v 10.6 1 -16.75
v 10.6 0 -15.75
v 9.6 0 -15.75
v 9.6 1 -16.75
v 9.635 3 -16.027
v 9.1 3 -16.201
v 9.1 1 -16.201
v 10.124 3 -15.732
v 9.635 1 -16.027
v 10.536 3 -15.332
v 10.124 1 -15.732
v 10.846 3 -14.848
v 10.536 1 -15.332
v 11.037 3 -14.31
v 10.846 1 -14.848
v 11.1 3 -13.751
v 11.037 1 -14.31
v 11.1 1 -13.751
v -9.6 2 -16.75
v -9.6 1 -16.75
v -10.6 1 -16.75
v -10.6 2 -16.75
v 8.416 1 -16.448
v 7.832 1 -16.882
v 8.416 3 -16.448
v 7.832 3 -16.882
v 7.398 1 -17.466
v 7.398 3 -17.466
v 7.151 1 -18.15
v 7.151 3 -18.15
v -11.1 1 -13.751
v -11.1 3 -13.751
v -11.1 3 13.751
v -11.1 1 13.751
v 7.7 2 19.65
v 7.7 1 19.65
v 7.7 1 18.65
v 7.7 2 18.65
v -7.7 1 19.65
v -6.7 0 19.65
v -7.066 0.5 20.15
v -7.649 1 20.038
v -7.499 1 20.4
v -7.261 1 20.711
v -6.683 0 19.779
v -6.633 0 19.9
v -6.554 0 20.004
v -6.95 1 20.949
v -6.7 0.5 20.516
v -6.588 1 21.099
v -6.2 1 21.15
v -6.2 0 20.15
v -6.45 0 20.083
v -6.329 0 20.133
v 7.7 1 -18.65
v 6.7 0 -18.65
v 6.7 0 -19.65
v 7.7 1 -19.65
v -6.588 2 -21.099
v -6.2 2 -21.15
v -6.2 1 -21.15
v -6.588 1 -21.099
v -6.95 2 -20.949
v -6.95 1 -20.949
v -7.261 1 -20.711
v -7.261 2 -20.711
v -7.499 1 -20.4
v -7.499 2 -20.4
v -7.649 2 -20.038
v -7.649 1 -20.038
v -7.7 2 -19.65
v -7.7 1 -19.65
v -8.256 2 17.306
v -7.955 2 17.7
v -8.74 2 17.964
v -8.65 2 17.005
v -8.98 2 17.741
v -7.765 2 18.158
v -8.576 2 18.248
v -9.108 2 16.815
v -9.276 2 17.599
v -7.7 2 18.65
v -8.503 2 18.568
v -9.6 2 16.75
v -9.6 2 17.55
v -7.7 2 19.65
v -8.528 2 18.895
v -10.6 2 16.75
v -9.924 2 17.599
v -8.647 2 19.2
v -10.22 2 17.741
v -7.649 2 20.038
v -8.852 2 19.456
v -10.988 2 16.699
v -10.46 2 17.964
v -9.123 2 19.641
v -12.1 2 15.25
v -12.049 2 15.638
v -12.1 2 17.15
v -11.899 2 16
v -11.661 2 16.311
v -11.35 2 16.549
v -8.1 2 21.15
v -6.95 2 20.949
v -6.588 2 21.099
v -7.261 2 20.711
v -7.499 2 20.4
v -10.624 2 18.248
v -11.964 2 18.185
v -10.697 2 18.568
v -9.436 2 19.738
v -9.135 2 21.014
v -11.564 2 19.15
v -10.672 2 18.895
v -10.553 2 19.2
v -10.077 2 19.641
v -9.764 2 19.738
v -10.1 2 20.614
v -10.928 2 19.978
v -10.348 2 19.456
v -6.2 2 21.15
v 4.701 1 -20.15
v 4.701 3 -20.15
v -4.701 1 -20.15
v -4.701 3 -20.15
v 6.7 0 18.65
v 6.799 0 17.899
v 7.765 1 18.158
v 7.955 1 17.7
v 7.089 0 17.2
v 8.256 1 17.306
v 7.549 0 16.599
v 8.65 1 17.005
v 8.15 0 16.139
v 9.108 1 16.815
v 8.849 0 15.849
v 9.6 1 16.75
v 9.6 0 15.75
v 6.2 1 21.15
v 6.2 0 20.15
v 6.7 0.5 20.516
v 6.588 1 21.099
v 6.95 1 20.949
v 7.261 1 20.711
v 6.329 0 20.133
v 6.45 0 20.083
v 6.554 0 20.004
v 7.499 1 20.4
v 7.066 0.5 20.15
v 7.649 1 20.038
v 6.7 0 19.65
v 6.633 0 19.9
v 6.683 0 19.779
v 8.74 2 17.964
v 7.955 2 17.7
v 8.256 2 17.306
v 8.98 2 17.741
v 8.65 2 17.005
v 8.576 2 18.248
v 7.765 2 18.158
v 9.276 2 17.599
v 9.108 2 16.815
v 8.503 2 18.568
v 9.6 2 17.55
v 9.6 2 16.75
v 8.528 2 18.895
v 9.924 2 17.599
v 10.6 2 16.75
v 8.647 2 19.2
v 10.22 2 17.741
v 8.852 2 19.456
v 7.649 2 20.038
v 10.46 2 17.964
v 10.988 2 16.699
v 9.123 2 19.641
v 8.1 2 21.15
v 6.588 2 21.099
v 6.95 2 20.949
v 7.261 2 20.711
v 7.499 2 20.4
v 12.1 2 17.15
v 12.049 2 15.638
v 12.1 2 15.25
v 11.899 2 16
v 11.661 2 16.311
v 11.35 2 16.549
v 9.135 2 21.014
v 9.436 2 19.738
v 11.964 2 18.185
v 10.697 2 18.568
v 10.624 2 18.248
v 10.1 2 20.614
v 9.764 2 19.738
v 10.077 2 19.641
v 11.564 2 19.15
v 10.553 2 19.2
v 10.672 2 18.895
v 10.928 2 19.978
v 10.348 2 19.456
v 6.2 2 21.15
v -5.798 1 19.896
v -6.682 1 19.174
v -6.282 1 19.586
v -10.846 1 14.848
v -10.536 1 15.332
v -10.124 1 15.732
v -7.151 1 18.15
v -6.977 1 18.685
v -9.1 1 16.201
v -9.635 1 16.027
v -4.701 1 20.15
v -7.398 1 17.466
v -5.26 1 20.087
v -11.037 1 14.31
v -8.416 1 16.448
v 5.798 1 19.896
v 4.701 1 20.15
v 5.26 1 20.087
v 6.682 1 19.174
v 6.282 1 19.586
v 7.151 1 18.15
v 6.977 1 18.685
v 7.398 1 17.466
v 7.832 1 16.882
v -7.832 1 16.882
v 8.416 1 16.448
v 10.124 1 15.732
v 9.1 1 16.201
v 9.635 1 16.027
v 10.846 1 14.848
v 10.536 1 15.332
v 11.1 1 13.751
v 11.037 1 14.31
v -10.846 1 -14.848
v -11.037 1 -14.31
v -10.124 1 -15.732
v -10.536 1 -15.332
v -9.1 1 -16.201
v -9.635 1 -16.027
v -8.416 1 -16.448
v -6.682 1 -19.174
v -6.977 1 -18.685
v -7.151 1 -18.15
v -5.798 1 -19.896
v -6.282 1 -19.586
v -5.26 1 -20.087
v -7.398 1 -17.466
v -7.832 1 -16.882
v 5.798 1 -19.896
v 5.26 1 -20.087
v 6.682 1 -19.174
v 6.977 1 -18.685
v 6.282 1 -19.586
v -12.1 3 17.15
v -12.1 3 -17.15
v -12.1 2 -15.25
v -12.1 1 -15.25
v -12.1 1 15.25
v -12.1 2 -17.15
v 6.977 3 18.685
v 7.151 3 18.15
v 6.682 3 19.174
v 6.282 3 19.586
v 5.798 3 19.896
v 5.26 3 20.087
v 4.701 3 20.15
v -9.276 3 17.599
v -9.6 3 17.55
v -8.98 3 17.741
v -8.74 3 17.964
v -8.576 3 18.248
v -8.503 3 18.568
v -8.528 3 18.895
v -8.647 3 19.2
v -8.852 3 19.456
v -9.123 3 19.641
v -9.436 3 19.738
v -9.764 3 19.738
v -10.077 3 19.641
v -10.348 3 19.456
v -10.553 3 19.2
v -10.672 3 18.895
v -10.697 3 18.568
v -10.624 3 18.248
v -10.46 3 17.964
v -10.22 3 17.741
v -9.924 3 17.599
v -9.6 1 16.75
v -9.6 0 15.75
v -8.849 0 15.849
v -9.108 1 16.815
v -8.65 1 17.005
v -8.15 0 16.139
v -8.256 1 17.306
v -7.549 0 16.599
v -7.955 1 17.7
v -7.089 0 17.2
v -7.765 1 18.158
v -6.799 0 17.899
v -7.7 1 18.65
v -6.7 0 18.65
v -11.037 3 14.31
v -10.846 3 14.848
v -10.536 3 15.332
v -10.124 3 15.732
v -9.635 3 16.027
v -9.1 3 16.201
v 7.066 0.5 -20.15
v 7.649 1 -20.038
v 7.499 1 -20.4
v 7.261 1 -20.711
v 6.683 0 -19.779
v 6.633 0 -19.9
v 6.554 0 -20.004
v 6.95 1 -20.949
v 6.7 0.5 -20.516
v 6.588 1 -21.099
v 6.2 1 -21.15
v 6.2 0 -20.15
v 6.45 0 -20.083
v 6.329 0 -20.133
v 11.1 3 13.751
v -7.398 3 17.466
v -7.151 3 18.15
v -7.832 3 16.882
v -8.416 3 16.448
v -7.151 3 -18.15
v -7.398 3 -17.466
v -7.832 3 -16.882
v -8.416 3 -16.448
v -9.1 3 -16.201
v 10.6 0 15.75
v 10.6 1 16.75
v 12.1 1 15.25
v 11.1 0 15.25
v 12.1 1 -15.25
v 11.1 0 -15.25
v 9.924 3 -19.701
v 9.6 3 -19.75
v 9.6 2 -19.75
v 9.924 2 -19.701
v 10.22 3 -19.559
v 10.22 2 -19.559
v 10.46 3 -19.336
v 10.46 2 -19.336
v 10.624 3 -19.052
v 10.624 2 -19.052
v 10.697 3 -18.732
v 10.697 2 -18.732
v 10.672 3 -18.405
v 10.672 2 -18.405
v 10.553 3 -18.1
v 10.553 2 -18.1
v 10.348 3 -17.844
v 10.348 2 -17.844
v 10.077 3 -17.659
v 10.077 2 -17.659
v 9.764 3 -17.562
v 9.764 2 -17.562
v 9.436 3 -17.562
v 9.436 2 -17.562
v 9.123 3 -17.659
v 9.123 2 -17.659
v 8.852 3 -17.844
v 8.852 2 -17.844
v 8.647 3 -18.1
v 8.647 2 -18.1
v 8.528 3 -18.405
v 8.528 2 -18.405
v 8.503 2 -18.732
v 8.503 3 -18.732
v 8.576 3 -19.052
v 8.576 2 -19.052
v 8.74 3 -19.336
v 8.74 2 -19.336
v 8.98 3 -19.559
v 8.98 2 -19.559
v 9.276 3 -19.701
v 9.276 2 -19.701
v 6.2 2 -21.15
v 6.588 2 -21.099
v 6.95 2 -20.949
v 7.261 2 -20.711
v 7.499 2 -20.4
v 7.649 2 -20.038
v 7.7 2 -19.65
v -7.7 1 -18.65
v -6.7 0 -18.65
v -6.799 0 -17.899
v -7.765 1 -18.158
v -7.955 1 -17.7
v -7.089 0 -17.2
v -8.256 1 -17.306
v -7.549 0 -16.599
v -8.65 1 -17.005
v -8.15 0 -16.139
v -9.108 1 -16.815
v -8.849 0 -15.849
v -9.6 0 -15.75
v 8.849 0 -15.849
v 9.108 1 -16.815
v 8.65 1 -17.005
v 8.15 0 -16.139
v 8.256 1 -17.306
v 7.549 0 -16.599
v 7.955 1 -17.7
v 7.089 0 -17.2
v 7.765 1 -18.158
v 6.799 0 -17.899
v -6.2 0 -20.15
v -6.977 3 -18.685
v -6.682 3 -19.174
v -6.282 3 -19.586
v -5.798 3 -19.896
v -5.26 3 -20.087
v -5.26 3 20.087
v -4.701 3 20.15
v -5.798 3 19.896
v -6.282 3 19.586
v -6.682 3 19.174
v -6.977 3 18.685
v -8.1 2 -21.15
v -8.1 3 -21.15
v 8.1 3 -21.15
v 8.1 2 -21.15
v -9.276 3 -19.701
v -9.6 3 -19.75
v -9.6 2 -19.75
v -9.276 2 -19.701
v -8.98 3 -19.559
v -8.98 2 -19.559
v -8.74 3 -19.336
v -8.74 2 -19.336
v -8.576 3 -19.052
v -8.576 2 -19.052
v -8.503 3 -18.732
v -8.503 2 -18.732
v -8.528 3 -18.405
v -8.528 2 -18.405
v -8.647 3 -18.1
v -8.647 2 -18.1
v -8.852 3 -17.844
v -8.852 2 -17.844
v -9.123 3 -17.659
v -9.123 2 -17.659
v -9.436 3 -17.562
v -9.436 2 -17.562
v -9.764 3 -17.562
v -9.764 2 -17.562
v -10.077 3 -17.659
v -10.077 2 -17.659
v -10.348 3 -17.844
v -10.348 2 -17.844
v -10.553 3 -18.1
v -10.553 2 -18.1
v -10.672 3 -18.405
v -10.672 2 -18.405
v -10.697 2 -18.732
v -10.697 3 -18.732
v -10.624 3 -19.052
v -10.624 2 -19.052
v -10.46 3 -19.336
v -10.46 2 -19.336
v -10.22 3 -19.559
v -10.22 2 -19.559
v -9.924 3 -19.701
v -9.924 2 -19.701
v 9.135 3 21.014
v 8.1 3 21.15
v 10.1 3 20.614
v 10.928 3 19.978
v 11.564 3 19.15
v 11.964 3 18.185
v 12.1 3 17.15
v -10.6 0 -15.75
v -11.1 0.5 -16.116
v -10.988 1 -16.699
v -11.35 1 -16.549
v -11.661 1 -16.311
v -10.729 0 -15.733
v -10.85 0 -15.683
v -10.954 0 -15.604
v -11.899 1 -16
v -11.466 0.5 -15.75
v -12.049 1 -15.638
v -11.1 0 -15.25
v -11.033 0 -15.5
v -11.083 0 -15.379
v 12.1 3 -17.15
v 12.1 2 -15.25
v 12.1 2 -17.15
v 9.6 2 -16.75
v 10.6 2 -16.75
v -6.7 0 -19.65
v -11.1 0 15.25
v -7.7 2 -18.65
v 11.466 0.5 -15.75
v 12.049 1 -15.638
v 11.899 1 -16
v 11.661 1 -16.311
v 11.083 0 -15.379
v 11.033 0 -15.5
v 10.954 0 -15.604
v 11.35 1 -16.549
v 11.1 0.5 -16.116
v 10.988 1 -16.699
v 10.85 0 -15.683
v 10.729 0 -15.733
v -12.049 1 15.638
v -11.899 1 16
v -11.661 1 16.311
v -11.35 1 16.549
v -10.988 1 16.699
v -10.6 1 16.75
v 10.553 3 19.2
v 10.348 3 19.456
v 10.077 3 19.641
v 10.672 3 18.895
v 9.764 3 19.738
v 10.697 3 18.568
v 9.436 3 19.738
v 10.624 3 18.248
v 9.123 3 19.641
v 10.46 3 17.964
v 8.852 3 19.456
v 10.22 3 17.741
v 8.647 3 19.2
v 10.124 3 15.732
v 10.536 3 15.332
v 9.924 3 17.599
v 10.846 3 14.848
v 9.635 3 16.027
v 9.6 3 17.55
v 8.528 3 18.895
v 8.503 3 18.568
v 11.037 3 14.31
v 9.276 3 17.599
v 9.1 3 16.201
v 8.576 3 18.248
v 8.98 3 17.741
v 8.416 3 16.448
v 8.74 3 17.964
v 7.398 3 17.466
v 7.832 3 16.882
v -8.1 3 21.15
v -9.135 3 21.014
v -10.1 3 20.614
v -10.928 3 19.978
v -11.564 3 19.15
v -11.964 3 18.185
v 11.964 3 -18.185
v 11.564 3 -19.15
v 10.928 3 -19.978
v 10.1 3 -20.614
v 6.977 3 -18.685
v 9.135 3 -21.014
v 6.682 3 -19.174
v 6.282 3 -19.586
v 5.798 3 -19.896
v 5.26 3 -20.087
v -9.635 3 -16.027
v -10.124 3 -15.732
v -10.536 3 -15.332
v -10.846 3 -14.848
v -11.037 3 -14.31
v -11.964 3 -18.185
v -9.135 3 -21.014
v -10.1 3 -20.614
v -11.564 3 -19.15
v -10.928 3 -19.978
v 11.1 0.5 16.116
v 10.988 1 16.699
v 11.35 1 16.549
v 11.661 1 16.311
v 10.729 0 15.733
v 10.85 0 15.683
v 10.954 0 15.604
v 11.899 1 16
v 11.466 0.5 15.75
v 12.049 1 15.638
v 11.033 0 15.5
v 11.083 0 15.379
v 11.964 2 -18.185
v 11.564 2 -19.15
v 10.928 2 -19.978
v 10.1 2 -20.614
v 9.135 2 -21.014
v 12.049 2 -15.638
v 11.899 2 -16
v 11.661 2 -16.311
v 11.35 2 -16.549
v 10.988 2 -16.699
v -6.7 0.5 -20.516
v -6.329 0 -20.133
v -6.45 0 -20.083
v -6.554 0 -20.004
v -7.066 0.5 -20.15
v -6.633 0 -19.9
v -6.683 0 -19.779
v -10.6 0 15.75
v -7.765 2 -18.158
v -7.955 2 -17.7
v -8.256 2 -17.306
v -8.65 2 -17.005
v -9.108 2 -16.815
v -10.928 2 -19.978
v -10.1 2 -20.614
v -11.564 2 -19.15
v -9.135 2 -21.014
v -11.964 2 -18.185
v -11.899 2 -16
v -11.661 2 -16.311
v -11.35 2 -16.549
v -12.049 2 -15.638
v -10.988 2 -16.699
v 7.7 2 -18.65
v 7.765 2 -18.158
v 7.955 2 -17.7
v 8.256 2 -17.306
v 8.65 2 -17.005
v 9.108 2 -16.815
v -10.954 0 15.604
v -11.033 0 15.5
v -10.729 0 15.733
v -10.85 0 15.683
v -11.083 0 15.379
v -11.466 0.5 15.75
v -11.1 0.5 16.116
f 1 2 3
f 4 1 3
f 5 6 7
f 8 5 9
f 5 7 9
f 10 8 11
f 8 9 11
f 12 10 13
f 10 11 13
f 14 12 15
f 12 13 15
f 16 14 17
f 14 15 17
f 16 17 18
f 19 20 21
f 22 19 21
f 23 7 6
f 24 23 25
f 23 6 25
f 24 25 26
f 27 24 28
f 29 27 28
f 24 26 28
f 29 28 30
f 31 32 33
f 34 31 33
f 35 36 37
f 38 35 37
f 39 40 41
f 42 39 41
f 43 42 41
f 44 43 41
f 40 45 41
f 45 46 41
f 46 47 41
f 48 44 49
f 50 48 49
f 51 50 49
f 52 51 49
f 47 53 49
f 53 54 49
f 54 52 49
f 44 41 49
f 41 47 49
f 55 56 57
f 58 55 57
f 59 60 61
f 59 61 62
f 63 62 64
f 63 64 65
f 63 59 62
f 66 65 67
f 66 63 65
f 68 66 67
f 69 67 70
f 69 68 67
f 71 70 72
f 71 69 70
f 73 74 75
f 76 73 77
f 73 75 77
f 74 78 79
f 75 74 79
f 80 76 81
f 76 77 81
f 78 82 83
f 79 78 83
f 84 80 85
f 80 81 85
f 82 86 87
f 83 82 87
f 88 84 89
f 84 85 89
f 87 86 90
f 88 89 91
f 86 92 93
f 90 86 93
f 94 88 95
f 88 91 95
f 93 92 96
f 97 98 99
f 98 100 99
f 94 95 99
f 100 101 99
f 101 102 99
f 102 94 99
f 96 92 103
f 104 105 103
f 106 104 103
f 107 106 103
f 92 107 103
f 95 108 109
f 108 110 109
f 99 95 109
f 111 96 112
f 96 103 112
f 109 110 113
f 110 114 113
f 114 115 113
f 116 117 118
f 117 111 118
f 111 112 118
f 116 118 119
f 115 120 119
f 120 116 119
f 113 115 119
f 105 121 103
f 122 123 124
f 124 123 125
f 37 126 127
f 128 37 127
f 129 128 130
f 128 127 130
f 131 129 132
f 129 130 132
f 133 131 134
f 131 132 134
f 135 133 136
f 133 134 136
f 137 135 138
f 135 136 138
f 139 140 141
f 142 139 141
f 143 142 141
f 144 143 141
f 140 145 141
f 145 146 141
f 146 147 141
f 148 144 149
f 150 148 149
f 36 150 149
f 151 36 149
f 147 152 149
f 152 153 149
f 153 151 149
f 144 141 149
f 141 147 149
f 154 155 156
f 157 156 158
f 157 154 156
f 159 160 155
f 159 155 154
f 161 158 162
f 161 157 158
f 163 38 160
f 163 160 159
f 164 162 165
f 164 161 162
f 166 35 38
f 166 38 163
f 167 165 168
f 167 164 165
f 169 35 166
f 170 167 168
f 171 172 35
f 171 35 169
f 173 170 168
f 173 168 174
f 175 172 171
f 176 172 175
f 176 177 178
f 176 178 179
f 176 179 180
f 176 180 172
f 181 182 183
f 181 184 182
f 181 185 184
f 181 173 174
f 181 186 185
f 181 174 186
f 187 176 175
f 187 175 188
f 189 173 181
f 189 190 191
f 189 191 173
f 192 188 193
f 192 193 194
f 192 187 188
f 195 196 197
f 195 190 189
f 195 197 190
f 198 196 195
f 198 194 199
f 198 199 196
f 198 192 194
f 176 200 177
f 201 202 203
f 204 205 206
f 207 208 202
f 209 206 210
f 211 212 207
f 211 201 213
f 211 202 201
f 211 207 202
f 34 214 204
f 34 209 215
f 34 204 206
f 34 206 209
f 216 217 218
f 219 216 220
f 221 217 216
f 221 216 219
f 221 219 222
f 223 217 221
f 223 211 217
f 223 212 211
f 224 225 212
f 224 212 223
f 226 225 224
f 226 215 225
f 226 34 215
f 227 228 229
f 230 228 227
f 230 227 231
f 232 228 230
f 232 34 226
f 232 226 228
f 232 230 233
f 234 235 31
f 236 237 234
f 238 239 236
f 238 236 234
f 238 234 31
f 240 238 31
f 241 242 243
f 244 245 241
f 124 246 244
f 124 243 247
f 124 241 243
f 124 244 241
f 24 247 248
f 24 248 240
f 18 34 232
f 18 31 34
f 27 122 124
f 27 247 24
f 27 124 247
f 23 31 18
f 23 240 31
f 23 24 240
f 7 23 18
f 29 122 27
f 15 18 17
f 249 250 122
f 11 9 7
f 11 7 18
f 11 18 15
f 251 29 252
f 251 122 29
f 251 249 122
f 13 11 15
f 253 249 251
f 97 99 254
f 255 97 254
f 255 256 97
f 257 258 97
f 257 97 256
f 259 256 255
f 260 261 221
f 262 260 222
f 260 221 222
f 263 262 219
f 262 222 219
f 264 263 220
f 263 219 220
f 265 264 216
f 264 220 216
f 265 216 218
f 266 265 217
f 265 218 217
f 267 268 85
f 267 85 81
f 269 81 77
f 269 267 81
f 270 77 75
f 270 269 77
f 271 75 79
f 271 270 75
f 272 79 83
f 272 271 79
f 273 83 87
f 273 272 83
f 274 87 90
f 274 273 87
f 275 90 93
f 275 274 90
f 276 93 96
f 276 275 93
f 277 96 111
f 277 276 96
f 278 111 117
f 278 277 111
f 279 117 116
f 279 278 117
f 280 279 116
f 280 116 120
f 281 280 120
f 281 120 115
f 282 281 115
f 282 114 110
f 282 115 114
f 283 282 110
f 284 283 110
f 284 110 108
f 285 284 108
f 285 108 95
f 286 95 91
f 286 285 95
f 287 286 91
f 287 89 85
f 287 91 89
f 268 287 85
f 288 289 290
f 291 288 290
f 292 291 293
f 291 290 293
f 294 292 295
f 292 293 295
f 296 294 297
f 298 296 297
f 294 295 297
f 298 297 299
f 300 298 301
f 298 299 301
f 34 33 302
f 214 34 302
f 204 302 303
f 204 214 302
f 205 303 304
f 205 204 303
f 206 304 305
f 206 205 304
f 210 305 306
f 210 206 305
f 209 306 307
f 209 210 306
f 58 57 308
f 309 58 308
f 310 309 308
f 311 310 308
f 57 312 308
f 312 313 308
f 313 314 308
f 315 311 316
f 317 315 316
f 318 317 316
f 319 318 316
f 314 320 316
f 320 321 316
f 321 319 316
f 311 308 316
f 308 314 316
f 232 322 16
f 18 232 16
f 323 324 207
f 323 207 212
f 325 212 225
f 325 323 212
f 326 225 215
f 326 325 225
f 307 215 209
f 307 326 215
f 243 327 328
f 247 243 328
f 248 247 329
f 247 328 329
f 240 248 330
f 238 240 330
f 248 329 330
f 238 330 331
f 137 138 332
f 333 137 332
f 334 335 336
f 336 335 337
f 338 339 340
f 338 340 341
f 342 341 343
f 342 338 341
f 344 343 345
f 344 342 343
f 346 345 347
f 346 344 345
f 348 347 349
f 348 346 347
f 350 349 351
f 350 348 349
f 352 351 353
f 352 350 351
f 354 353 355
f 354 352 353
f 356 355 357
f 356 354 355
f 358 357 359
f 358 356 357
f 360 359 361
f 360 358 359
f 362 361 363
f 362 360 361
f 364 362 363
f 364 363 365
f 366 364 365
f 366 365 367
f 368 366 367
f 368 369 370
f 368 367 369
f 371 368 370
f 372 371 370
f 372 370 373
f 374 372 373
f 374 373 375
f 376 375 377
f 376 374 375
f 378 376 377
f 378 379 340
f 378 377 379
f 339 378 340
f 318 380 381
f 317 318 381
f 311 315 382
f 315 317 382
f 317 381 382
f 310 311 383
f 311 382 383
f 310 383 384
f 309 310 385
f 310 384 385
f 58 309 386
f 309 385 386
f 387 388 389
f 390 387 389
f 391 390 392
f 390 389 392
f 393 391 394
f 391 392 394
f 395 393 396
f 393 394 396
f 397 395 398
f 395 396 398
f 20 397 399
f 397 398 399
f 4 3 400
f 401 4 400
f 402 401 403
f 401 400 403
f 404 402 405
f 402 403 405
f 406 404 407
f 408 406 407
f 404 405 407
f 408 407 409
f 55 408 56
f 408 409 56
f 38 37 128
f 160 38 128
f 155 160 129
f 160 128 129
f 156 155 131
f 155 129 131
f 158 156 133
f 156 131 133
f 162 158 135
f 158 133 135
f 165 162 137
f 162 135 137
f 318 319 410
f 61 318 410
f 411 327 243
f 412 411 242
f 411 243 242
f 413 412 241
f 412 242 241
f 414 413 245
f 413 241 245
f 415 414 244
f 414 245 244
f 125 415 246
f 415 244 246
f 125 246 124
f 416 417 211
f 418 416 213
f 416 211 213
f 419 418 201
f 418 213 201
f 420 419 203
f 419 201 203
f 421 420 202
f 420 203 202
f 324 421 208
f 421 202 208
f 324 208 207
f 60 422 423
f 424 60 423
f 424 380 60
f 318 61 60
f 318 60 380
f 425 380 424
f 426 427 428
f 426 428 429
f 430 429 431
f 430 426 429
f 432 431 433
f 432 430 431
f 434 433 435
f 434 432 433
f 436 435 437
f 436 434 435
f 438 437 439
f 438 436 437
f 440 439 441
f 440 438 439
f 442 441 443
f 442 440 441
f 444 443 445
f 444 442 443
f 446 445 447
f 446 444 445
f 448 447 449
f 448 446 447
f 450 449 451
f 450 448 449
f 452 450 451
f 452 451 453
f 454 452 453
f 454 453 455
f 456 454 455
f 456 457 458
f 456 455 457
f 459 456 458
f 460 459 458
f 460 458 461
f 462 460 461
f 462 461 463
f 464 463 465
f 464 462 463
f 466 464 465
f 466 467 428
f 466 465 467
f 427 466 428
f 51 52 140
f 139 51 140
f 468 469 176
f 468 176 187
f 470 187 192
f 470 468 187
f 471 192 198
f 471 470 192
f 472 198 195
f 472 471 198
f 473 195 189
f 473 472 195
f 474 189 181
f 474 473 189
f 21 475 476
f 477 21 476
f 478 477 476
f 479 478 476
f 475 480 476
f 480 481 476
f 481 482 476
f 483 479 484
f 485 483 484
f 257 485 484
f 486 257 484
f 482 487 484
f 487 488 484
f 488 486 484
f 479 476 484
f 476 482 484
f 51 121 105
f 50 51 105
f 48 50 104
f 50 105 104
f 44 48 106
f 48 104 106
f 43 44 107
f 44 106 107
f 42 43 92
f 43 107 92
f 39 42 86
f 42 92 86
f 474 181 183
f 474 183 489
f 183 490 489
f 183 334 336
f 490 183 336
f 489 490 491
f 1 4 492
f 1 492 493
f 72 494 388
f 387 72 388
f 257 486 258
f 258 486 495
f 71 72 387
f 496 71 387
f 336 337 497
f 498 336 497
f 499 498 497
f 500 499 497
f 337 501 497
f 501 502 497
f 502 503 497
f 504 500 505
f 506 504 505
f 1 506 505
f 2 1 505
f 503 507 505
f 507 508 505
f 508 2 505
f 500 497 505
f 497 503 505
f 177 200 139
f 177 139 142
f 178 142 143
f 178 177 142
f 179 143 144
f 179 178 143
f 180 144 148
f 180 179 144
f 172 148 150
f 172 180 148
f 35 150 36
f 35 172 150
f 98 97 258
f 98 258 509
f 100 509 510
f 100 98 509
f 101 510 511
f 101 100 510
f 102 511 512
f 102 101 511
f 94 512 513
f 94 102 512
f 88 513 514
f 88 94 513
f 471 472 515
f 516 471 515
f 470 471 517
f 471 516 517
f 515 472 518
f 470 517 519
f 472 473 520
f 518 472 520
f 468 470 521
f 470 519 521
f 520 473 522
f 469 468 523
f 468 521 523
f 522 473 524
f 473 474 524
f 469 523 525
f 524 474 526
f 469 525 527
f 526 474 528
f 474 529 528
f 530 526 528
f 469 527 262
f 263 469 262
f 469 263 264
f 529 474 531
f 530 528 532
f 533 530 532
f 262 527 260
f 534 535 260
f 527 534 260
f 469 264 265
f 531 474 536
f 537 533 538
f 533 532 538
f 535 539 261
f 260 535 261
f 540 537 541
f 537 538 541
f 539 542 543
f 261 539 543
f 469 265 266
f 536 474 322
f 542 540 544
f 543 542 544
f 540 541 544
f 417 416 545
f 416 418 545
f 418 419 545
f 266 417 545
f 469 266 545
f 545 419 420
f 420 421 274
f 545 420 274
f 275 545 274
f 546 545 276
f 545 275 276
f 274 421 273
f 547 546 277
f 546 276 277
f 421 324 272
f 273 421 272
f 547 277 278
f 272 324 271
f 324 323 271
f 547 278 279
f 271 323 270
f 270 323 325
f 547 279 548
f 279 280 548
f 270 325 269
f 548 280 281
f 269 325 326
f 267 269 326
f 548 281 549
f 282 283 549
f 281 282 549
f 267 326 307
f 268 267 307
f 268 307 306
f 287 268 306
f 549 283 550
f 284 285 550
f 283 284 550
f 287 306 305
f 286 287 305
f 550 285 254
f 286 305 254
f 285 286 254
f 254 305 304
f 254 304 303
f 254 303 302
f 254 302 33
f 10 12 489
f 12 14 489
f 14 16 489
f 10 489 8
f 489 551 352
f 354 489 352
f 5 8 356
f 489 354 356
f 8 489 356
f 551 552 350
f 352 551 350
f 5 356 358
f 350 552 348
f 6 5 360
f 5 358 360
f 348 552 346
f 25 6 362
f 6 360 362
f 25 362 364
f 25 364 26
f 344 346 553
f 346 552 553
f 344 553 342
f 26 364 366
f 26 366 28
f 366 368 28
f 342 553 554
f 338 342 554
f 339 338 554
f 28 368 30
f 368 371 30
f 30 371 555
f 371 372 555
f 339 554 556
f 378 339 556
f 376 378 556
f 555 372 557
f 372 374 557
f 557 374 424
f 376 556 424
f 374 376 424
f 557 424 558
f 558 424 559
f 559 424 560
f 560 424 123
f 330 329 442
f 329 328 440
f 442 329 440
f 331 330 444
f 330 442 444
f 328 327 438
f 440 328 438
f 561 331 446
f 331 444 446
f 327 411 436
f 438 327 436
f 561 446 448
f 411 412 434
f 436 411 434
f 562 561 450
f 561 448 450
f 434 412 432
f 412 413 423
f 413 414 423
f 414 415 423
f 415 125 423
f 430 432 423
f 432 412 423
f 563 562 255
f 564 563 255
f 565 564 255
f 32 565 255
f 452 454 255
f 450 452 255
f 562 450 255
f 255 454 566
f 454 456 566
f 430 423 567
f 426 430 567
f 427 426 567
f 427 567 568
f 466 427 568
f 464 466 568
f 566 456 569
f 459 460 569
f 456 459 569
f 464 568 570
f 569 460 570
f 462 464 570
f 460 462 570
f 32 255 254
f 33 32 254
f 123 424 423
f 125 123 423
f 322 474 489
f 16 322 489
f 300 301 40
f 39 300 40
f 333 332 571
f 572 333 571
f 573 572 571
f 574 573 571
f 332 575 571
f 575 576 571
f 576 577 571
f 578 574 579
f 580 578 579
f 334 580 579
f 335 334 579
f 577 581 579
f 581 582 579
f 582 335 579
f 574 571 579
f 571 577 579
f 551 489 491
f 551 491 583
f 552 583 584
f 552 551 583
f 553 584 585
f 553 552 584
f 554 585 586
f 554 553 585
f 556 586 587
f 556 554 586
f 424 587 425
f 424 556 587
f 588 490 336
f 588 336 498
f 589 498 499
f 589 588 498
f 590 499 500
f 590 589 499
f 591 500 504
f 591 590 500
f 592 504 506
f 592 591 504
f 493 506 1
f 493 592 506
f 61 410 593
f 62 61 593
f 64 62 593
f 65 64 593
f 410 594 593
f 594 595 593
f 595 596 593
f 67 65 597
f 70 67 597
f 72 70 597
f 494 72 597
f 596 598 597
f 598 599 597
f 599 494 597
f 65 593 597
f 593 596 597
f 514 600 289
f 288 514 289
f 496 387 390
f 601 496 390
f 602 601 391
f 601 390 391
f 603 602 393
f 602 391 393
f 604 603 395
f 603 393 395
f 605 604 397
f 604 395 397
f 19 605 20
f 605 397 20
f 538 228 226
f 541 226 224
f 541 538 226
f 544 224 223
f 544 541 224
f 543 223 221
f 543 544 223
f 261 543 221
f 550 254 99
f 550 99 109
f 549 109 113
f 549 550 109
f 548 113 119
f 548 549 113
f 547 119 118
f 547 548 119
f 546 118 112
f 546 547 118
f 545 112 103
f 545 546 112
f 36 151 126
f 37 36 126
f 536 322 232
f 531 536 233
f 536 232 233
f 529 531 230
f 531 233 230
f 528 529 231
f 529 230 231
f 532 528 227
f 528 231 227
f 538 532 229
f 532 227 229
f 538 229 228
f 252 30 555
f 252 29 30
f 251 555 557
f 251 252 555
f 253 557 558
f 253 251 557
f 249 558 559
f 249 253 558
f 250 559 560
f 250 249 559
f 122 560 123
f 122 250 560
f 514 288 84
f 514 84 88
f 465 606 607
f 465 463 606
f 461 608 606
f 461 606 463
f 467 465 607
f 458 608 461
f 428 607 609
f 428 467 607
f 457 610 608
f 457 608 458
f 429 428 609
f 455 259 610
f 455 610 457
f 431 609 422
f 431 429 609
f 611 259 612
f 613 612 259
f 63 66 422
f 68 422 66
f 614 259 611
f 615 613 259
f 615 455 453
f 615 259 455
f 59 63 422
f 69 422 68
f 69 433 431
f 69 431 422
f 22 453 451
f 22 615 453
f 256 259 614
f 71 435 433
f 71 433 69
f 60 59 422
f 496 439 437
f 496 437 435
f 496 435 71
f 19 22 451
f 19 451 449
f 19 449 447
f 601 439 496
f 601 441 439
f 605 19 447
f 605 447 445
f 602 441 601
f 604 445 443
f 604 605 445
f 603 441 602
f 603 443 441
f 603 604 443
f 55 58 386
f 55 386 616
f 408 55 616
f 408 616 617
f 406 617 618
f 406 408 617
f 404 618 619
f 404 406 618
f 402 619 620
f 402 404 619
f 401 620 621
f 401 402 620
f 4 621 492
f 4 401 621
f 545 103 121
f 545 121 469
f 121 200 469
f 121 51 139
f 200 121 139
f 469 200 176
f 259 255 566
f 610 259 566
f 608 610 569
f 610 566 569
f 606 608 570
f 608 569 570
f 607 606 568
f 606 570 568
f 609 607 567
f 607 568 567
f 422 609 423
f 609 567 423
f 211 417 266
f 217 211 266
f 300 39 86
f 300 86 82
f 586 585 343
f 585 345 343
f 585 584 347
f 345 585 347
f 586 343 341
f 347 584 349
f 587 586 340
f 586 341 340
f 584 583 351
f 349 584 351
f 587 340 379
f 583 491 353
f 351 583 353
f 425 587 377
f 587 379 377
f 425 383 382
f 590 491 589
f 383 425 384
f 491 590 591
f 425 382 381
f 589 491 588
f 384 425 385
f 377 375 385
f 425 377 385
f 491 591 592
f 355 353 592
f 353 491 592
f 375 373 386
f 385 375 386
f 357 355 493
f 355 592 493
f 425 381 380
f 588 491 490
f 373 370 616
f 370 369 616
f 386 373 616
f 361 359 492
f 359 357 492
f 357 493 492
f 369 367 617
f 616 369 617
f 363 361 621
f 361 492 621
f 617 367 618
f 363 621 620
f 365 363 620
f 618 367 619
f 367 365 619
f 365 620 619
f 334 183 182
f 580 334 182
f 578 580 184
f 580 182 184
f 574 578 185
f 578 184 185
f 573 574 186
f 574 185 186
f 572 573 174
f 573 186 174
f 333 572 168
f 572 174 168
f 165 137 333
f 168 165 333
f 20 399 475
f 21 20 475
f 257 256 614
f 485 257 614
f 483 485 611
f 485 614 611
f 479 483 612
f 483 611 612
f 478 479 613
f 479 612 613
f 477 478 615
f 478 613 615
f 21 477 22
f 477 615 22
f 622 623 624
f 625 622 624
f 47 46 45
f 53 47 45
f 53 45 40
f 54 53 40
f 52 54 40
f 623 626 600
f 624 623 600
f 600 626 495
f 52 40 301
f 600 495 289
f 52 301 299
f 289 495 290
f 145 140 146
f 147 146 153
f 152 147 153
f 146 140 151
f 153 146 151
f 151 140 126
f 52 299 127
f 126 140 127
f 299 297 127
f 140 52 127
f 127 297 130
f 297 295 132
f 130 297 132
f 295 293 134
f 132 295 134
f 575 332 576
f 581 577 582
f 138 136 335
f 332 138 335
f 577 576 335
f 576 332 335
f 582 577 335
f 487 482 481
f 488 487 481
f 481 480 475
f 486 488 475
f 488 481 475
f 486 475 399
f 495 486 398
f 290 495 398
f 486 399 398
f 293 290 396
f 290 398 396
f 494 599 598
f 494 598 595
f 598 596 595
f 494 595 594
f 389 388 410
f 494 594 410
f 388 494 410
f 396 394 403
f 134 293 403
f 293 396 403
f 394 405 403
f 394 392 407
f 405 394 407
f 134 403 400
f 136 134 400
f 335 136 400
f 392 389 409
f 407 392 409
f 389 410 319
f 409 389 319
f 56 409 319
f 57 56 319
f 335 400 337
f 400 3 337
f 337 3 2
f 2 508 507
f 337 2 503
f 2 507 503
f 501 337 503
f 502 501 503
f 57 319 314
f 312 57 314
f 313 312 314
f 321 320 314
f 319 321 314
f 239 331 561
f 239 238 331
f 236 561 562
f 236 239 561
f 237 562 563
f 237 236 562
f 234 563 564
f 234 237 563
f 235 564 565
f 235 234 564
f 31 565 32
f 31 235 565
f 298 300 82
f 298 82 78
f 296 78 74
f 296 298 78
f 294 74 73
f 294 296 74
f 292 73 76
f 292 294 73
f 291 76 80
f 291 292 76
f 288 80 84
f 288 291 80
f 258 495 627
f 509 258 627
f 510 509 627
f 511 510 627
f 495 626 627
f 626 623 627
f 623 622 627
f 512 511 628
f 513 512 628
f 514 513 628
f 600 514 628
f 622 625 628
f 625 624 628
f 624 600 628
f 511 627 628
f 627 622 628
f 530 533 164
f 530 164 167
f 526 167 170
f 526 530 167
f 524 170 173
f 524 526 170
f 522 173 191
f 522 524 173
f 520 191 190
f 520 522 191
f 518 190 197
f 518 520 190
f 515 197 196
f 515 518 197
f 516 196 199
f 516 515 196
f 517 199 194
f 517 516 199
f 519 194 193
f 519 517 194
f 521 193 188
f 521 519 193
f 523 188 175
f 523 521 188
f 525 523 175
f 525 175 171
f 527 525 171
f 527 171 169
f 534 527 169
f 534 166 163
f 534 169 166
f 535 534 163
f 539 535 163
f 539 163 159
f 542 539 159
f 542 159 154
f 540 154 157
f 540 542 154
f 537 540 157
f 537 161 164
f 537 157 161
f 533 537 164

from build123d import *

# Parameters (mm, degrees)
SKETCH_1_W               = 24.2
SKETCH_1_H               = 42.3
EXTRUDE_1_DEPTH          = 3
FILLET_1_R               = 4
CUT_EXTRUDE_1_DEPTH      = 2
EXTRUDE_START            = 2
EXTRUDE_2_DEPTH          = 2
FILLET_2_R               = 2.5
CUT_EXTRUDE_2_DEPTH      = 25.550611138
CUT_EXTRUDE_2_DEPTH_BACK = 25.550611138
SKETCH_4_R               = 1.1
CUT_EXTRUDE_3_DEPTH      = 2
FILLET_3_R               = 1.5
CHAMFER_1_SIZE           = 1


with BuildPart() as part:
    # 草图1 → 凸台-拉伸1 (new body)
    with BuildSketch(Plane(origin=(0, 0, 0), x_dir=(1, 0, 0), z_dir=(0, 1, 0))):
        Rectangle(SKETCH_1_W, SKETCH_1_H)
    extrude(amount=EXTRUDE_1_DEPTH)

    # 圆角1
    fillet_1_edges = [part.edges().sort_by_distance(p)[0] for p in [
        (12.1, 1.5, 21.15),
        (-12.1, 1.5, 21.15),
        (-12.1, 1.5, -21.15),
        (12.1, 1.5, -21.15),
    ]]
    fillet(fillet_1_edges, radius=FILLET_1_R)

    # 草图2 → 切除-拉伸1 (cut)
    with BuildSketch(Plane(origin=(0, 3, 0), x_dir=(1, 0, 0), z_dir=(0, 1, 0))):
        with BuildLine():
            Line((8.1, 20.15), (-8.1, 20.15))
            ThreePointArc((-8.1, 20.15), (-10.221320344, 19.271320344), (-11.1, 17.15))
            Line((-11.1, 17.15), (-11.1, -17.15))
            ThreePointArc((-11.1, -17.15), (-10.221320344, -19.271320344), (-8.1, -20.15))
            Line((-8.1, -20.15), (8.1, -20.15))
            ThreePointArc((8.1, -20.15), (10.221320344, -19.271320344), (11.1, -17.15))
            Line((11.1, -17.15), (11.1, 17.15))
            ThreePointArc((11.1, 17.15), (10.221320344, 19.271320344), (8.1, 20.15))
        make_face()
    extrude(amount=-CUT_EXTRUDE_1_DEPTH, mode=Mode.SUBTRACT)

    # 草图3 → 凸台-拉伸2 (add)
    with BuildSketch(Plane(origin=(0, 1, 0), x_dir=(1, 0, 0), z_dir=(0, 1, 0)).offset(EXTRUDE_START)):
        with BuildLine():
            Line((-9.6, 16.15), (-11.1, 16.15))
            Line((-11.1, 16.15), (-11.1, 17.15))
            ThreePointArc((-11.1, 17.15), (-10.221320344, 19.271320344), (-8.1, 20.15))
            Line((-8.1, 20.15), (-7.1, 20.15))
            Line((-7.1, 20.15), (-7.1, 18.65))
            ThreePointArc((-7.1, 18.65), (-7.832233047, 16.882233047), (-9.6, 16.15))
        make_face()
        with BuildLine():
            Line((7.1, 18.65), (7.1, 20.15))
            Line((7.1, 20.15), (8.1, 20.15))
            ThreePointArc((8.1, 20.15), (10.221320344, 19.271320344), (11.1, 17.15))
            Line((11.1, 17.15), (11.1, 16.15))
            Line((11.1, 16.15), (9.6, 16.15))
            ThreePointArc((9.6, 16.15), (7.832233047, 16.882233047), (7.1, 18.65))
        make_face()
        with BuildLine():
            Line((-8.1, -20.15), (-7.1, -20.15))
            Line((-7.1, -20.15), (-7.1, -18.65))
            ThreePointArc((-7.1, -18.65), (-7.832233047, -16.882233047), (-9.6, -16.15))
            Line((-9.6, -16.15), (-11.1, -16.15))
            Line((-11.1, -16.15), (-11.1, -17.15))
            ThreePointArc((-11.1, -17.15), (-10.221320344, -19.271320344), (-8.1, -20.15))
        make_face()
        with BuildLine():
            Line((11.1, -17.15), (11.1, -16.15))
            Line((11.1, -16.15), (9.6, -16.15))
            ThreePointArc((9.6, -16.15), (7.832233047, -16.882233047), (7.1, -18.65))
            Line((7.1, -18.65), (7.1, -20.15))
            Line((7.1, -20.15), (8.1, -20.15))
            ThreePointArc((8.1, -20.15), (10.221320344, -19.271320344), (11.1, -17.15))
        make_face()
    extrude(amount=-EXTRUDE_2_DEPTH)

    # 圆角2
    fillet_2_edges = [part.edges().sort_by_distance(p)[0] for p in [
        (7.1, 2, 20.15),
        (11.1, 2, 16.15),
        (11.1, 2, -16.15),
        (7.1, 2, -20.15),
        (-7.1, 2, -20.15),
        (-11.1, 2, 16.15),
        (-7.1, 2, 20.15),
        (-11.1, 2, -16.15),
    ]]
    fillet(fillet_2_edges, radius=FILLET_2_R)

    # 草图4 → 切除-拉伸2 (cut, two sides: drawn at the far end of the back side and taken through both)
    with BuildSketch(Plane.XZ.offset(-CUT_EXTRUDE_2_DEPTH_BACK)):
        with Locations(Location((-9.6, 18.65, 0), (0, 0, 270))):
            Circle(SKETCH_4_R)
        with Locations(Location((9.6, 18.65, 0), (0, 0, 270))):
            Circle(SKETCH_4_R)
        with Locations(Location((9.6, -18.65, 0), (0, 0, 270))):
            Circle(SKETCH_4_R)
        with Locations(Location((-9.6, -18.65, 0), (0, 0, 270))):
            Circle(SKETCH_4_R)
    extrude(amount=CUT_EXTRUDE_2_DEPTH + CUT_EXTRUDE_2_DEPTH_BACK, mode=Mode.SUBTRACT)

    # 草图5 → 切除-拉伸3 (cut)
    with BuildSketch(Plane.XZ):
        with BuildLine():
            Line((-9.6, 16.75), (-12.1, 16.75))
            Line((-12.1, 16.75), (-12.1, 21.15))
            Line((-12.1, 21.15), (-7.7, 21.15))
            Line((-7.7, 21.15), (-7.7, 18.65))
            ThreePointArc((-7.7, 18.65), (-8.256497116, 17.306497116), (-9.6, 16.75))
        make_face()
        with BuildLine():
            Line((9.6, 16.75), (12.1, 16.75))
            Line((12.1, 16.75), (12.1, 21.15))
            Line((12.1, 21.15), (7.7, 21.15))
            Line((7.7, 21.15), (7.7, 18.65))
            ThreePointArc((7.7, 18.65), (8.256497116, 17.306497116), (9.6, 16.75))
        make_face()
        with BuildLine():
            Line((9.6, -16.75), (12.1, -16.75))
            Line((12.1, -16.75), (12.1, -21.15))
            Line((12.1, -21.15), (7.7, -21.15))
            Line((7.7, -21.15), (7.7, -18.65))
            ThreePointArc((7.7, -18.65), (8.256497116, -17.306497116), (9.6, -16.75))
        make_face()
        with BuildLine():
            Line((-9.6, -16.75), (-12.1, -16.75))
            Line((-12.1, -16.75), (-12.1, -21.15))
            Line((-12.1, -21.15), (-7.7, -21.15))
            Line((-7.7, -21.15), (-7.7, -18.65))
            ThreePointArc((-7.7, -18.65), (-8.256497116, -17.306497116), (-9.6, -16.75))
        make_face()
    extrude(amount=-CUT_EXTRUDE_3_DEPTH, mode=Mode.SUBTRACT)

    # 圆角3
    fillet_3_edges = [part.edges().sort_by_distance(p)[0] for p in [
        (-7.7, 1, -21.15),
        (-12.1, 1, -16.75),
        (12.1, 1, -16.75),
        (7.7, 1, -21.15),
        (7.7, 1, 21.15),
        (12.1, 1, 16.75),
        (-12.1, 1, 16.75),
        (-7.7, 1, 21.15),
    ]]
    fillet(fillet_3_edges, radius=FILLET_3_R)

    # 倒角1
    chamfer_1_edges = [part.edges().sort_by_distance(p)[0] for p in [
        (-8.256497116, 0, -17.306497116),
        (-10.1, 0, -16.75),
        (8.256497116, 0, -17.306497116),
        (7.7, 0, -19.15),
        (8.256497116, 0, 17.306497116),
        (10.1, 0, 16.75),
        (-8.256497116, 0, 17.306497116),
        (-7.7, 0, 19.15),
        (-12.1, 0, 0),
        (-7.7, 0, -19.15),
        (0, 0, -21.15),
        (10.1, 0, -16.75),
        (12.1, 0, 0),
        (7.7, 0, 19.15),
        (0, 0, 21.15),
        (-10.1, 0, 16.75),
        (-11.660660172, 0, 16.310660172),
        (-7.260660172, 0, -20.710660172),
        (7.260660172, 0, -20.710660172),
        (11.660660172, 0, -16.310660172),
        (11.660660172, 0, 16.310660172),
        (7.260660172, 0, 20.710660172),
        (-7.260660172, 0, 20.710660172),
        (-11.660660172, 0, -16.310660172),
    ]]
    chamfer(chamfer_1_edges, length=CHAMFER_1_SIZE)


solid = part.part
